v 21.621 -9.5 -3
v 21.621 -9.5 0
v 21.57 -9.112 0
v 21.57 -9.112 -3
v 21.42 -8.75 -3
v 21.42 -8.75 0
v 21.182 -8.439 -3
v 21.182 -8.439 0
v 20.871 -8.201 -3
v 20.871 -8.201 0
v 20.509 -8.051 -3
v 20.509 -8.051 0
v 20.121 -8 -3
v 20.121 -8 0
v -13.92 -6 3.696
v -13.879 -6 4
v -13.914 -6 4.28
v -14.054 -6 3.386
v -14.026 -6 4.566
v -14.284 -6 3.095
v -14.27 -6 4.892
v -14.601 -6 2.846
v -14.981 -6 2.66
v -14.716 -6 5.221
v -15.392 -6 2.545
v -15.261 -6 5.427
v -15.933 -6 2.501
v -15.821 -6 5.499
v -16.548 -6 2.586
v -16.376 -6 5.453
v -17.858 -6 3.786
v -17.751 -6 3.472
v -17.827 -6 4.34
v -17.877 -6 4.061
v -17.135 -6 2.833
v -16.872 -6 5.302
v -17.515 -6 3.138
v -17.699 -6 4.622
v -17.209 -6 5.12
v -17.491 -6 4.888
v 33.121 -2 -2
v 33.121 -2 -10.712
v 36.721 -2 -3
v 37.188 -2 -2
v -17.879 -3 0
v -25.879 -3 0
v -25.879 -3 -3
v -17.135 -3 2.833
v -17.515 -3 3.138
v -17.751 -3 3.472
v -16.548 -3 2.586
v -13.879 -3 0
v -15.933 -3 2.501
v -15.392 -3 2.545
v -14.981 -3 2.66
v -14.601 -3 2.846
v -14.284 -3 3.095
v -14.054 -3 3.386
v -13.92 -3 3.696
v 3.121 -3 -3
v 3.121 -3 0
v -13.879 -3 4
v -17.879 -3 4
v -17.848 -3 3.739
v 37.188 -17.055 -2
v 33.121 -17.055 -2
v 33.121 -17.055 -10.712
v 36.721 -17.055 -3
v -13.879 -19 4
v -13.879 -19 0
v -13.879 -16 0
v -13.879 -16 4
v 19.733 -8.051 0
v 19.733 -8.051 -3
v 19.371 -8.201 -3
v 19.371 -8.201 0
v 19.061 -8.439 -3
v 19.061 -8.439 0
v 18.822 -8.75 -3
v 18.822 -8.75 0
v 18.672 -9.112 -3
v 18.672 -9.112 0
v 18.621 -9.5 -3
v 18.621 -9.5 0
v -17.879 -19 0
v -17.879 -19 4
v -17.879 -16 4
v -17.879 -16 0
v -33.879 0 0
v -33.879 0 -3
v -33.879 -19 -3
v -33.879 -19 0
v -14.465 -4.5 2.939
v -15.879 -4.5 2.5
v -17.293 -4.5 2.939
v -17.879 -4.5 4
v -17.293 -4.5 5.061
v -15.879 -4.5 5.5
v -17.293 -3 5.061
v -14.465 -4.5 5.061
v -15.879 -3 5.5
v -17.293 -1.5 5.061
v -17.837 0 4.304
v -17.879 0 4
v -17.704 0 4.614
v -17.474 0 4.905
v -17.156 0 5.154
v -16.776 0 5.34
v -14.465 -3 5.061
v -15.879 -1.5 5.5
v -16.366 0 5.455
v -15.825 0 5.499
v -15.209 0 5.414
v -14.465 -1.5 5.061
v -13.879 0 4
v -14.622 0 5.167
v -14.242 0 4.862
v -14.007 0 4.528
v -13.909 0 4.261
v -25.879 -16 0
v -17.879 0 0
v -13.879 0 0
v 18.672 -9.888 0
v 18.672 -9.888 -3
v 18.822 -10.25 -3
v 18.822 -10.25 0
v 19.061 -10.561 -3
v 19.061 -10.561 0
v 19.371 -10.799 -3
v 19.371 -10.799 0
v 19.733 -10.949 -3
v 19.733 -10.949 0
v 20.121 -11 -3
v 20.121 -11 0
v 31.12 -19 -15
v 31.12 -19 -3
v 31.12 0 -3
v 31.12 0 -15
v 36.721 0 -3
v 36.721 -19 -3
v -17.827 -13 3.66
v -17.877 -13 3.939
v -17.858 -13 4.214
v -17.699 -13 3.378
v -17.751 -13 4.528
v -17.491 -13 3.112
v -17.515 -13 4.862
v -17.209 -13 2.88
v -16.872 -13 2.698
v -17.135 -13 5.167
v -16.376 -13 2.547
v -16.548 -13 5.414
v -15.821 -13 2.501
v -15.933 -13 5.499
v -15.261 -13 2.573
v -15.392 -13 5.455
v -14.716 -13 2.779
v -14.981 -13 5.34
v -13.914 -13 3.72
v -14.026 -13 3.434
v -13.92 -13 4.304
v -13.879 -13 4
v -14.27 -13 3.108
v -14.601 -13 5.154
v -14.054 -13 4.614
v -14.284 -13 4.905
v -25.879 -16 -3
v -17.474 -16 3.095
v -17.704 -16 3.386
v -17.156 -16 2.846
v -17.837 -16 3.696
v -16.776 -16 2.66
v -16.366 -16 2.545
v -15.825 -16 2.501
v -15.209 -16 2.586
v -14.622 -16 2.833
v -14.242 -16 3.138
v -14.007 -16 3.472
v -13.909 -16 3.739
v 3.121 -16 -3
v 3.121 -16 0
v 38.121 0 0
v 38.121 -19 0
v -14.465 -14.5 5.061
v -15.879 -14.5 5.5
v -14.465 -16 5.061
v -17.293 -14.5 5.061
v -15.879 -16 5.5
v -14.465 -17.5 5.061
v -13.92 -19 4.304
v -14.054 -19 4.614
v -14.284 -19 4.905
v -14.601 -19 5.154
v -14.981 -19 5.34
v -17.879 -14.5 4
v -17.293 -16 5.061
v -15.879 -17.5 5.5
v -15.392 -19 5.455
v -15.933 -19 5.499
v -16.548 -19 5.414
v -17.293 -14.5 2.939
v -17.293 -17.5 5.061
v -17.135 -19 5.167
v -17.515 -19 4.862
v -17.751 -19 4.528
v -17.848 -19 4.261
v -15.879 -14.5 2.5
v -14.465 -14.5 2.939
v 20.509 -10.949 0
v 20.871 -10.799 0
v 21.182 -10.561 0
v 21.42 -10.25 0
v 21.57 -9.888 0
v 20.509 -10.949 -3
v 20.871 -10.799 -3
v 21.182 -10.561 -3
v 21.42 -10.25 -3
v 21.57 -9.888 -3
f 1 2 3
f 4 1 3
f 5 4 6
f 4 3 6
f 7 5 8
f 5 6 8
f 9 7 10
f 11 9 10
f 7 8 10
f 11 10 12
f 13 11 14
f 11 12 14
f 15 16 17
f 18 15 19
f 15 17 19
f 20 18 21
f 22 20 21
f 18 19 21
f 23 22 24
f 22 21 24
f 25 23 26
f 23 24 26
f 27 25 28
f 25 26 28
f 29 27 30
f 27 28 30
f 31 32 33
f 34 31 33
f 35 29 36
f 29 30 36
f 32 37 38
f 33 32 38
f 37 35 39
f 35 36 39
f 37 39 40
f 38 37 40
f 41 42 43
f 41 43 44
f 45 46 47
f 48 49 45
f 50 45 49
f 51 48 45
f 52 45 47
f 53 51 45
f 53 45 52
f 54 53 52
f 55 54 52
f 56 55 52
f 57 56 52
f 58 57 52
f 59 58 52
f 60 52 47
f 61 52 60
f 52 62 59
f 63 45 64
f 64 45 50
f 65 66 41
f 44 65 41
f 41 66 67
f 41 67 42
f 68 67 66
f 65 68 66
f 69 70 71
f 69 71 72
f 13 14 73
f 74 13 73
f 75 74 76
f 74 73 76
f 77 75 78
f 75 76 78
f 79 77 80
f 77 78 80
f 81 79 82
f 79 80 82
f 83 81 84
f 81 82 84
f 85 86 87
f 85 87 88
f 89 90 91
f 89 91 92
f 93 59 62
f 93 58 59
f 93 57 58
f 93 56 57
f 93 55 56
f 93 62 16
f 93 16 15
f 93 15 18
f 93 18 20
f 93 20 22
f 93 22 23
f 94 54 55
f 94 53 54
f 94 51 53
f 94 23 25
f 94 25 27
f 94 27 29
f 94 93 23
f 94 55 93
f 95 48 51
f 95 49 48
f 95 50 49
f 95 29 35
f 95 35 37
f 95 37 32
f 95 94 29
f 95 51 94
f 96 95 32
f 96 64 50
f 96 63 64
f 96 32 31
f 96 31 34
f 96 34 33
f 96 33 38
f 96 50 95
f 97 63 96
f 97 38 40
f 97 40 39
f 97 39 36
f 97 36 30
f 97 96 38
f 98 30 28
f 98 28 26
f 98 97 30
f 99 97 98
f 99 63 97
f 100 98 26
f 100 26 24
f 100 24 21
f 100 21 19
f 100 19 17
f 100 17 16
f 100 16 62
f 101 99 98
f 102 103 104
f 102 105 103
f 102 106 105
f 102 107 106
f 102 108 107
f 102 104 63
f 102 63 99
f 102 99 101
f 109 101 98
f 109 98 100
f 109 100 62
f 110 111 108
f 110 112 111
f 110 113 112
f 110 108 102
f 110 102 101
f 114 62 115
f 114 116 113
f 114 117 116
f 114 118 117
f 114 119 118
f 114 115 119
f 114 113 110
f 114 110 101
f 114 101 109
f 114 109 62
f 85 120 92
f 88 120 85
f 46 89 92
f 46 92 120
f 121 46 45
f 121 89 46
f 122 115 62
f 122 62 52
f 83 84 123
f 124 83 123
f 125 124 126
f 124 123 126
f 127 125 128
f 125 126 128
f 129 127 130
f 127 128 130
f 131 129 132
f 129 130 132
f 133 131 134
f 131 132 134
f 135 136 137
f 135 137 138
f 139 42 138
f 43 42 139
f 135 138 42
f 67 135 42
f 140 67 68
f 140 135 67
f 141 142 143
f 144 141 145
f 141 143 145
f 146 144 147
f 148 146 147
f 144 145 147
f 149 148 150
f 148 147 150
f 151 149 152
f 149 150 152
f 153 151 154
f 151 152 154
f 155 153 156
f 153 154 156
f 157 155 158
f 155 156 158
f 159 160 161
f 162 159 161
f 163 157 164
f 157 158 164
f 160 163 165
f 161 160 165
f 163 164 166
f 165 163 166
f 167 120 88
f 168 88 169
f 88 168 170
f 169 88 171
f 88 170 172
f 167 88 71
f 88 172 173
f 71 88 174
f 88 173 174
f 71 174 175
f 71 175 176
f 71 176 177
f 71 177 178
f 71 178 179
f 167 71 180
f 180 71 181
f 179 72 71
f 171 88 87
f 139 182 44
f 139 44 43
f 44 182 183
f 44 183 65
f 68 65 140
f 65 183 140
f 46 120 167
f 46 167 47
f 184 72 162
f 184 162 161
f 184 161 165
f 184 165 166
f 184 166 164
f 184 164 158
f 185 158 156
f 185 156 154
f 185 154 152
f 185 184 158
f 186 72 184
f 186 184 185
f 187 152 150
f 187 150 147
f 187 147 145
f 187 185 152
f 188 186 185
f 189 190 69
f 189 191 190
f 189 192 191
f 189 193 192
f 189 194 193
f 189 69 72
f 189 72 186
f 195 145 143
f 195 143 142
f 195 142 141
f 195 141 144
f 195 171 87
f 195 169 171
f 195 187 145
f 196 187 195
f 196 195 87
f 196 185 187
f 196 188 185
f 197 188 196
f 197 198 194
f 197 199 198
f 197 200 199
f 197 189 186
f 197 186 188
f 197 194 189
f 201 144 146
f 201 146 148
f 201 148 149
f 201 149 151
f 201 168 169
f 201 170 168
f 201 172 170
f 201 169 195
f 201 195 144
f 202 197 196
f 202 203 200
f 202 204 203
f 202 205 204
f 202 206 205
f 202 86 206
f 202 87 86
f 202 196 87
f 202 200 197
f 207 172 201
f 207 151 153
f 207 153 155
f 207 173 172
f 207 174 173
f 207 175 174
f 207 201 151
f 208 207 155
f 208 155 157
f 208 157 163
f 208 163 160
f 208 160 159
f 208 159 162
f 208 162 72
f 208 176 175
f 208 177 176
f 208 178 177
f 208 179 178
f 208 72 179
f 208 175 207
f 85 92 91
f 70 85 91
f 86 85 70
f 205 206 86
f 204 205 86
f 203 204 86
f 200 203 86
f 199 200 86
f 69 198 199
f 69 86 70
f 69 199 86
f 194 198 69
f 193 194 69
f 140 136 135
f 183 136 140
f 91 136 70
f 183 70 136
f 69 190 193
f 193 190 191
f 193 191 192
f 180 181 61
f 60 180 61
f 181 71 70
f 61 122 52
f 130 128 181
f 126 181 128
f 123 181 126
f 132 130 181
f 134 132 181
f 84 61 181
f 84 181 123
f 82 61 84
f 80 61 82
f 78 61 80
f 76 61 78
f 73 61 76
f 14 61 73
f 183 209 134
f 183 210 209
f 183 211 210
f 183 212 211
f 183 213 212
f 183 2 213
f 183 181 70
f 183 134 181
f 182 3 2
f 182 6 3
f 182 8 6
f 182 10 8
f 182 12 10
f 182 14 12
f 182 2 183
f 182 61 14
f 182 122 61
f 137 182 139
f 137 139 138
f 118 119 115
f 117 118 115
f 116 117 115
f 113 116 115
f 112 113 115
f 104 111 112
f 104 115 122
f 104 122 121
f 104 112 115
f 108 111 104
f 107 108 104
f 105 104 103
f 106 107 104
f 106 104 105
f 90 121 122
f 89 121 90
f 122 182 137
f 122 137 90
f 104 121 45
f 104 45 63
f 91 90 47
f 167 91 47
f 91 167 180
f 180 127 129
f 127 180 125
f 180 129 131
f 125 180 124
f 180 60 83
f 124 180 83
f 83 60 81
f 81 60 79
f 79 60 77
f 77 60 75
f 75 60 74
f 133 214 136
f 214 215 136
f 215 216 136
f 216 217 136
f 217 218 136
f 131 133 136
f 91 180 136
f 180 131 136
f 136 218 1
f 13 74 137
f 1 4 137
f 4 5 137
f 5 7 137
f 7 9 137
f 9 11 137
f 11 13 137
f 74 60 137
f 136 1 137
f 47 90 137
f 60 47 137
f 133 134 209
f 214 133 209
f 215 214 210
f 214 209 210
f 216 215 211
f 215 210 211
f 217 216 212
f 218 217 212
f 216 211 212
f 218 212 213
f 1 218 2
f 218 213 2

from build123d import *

# Parameters (mm, degrees)
F0_W      = 72
F0_H      = 3
F1_DEPTH  = 19
F2_W      = 29
F2_H      = 13
F3_DEPTH  = 12.5
F7_DEPTH  = 19
F8_DEPTH  = 20
F9_W      = 15.054653123
F9_H      = 17.4366760552
F10_DEPTH = 25
F12_DEPTH = 12.5
F14_DEPTH = 3
F15_DEPTH = 6
F17_DEPTH = 3
F18_DEPTH = 6


with BuildPart() as f1:
    # F0 (on Front) → F1 (new body)
    with BuildSketch(Plane.XZ):
        with Locations((2.1212100983, -1.5)):
            Rectangle(F0_W, F0_H)
    extrude(amount=F1_DEPTH)

    # F2 (on face) → F3 (cut, symmetric)
    with BuildSketch(Plane.XY):
        with Locations((-11.3787899017, -9.5)):
            Rectangle(F2_W, F2_H)
    extrude(amount=F3_DEPTH, both=True, mode=Mode.SUBTRACT)

    # F6 (on face) → F7 (join)
    with BuildSketch(Plane.XZ.offset(19)):
        Polygon((36.7209195002, -3), (38.1212100983, 0), (31.1197824776, 0), (31.1197824776, -3), align=None)
        Polygon((31.1197824776, -14.999945648), (36.7209195002, -3), (31.1197824776, -3), align=None)
    extrude(amount=-F7_DEPTH)

    # F6 (on face) → F8 (cut, symmetric)
    with BuildSketch(Plane.XZ.offset(19)):
        Polygon((38.1212100983, -3), (38.1212100983, 0), (36.7209195002, -3), align=None)
        Polygon((42.2334298491, 0), (38.1212100983, 0), (38.1212100983, -3), (36.7209195002, -3), (31.1197824776, -14.999945648), (42.2334298491, -15.8877465874), align=None)
    extrude(amount=F8_DEPTH, both=True, mode=Mode.SUBTRACT)

    # F9 (on offset) → F10 (cut)
    with BuildSketch(Plane.YZ.offset(33.1212100983)):
        with Locations((-9.5273265615, -10.7183380276)):
            Rectangle(F9_W, F9_H)
    extrude(amount=F10_DEPTH, mode=Mode.SUBTRACT)

    # F11 (on face) → F12 (cut, symmetric)
    with BuildSketch(Plane.XY):
        with BuildLine():
            Line((20.1212100983, -9.5), (20.1212100983, -8))
            ThreePointArc((20.1212100983, -8), (19.0605499265, -8.4393398282), (18.6212100983, -9.5))
            Line((18.6212100983, -9.5), (20.1212100983, -9.5))
        make_face()
        with BuildLine():
            ThreePointArc((21.6212100983, -9.5), (21.18187027, -8.4393398282), (20.1212100983, -8))
            Line((20.1212100983, -8), (20.1212100983, -9.5))
            Line((20.1212100983, -9.5), (20.1212100983, -11))
            ThreePointArc((20.1212100983, -11), (21.18187027, -10.5606601718), (21.6212100983, -9.5))
        make_face()
        with BuildLine():
            Line((20.1212100983, -9.5), (18.6212100983, -9.5))
            ThreePointArc((18.6212100983, -9.5), (19.0605499265, -10.5606601718), (20.1212100983, -11))
            Line((20.1212100983, -11), (20.1212100983, -9.5))
        make_face()
    extrude(amount=F12_DEPTH, both=True, mode=Mode.SUBTRACT)

    # F13 (on face) → F14 (join)
    with BuildSketch(Plane.XZ.offset(19)):
        with BuildLine():
            Line((-17.8787899017, 4), (-17.8787899017, 0))
            Line((-17.8787899017, 0), (-13.8787899017, 0))
            Line((-13.8787899017, 0), (-13.8787899017, 4))
            add(Edge.make_bspline(
                [(-17.8787899017, 4), (-17.8787899017, 2.5), (-15.8787899017, 2.5), (-13.8787899017, 2.5), (-13.8787899017, 4)],
                knots=[3.1415926536, 3.1415926536, 3.1415926536, 4.7123889804, 4.7123889804, 6.2831853072, 6.2831853072, 6.2831853072], degree=2, weights=[1, 0.7071067812, 1, 0.7071067812, 1]))
        make_face()
    extrude(amount=-F14_DEPTH)

    # F13 (on face) → F15 (join)
    with BuildSketch(Plane.XZ.offset(19)):
        with BuildLine():
            Line((-13.8787899017, 4), (-17.8787899017, 4))
            add(Edge.make_bspline(
                [(-17.8787899017, 4), (-17.8787899017, 2.5), (-15.8787899017, 2.5), (-13.8787899017, 2.5), (-13.8787899017, 4)],
                knots=[3.1415926536, 3.1415926536, 3.1415926536, 4.7123889804, 4.7123889804, 6.2831853072, 6.2831853072, 6.2831853072], degree=2, weights=[1, 0.7071067812, 1, 0.7071067812, 1]))
        make_face()
        with BuildLine():
            add(Edge.make_bspline(
                [(-13.8787899017, 4), (-13.8787899017, 5.5), (-15.8787899017, 5.5), (-17.8787899017, 5.5), (-17.8787899017, 4)],
                knots=[0, 0, 0, 1.5707963268, 1.5707963268, 3.1415926536, 3.1415926536, 3.1415926536], degree=2, weights=[1, 0.7071067812, 1, 0.7071067812, 1]))
            Line((-17.8787899017, 4), (-13.8787899017, 4))
        make_face()
    extrude(amount=-F15_DEPTH)

    # F16 (on face) → F17 (join)
    with BuildSketch(Plane(origin=(0, 0, 0), x_dir=(-1, 0, 0), z_dir=(0, 1, 0))):
        with BuildLine():
            Line((13.8787899017, 4), (13.8787899017, 0))
            Line((13.8787899017, 0), (17.8787899017, 0))
            Line((17.8787899017, 0), (17.8787899017, 4))
            add(Edge.make_bspline(
                [(13.8787899017, 4), (13.8787899017, 2.5), (15.8787899017, 2.5), (17.8787899017, 2.5), (17.8787899017, 4)],
                knots=[3.1415926536, 3.1415926536, 3.1415926536, 4.7123889804, 4.7123889804, 6.2831853072, 6.2831853072, 6.2831853072], degree=2, weights=[1, 0.7071067812, 1, 0.7071067812, 1]))
        make_face()
    extrude(amount=-F17_DEPTH)

    # F16 (on face) → F18 (join)
    with BuildSketch(Plane(origin=(0, 0, 0), x_dir=(-1, 0, 0), z_dir=(0, 1, 0))):
        with BuildLine():
            add(Edge.make_bspline(
                [(17.8787899017, 4), (17.8787899017, 5.5), (15.8787899017, 5.5), (13.8787899017, 5.5), (13.8787899017, 4)],
                knots=[0, 0, 0, 1.5707963268, 1.5707963268, 3.1415926536, 3.1415926536, 3.1415926536], degree=2, weights=[1, 0.7071067812, 1, 0.7071067812, 1]))
            add(Edge.make_bspline(
                [(13.8787899017, 4), (13.8787899017, 2.5), (15.8787899017, 2.5), (17.8787899017, 2.5), (17.8787899017, 4)],
                knots=[3.1415926536, 3.1415926536, 3.1415926536, 4.7123889804, 4.7123889804, 6.2831853072, 6.2831853072, 6.2831853072], degree=2, weights=[1, 0.7071067812, 1, 0.7071067812, 1]))
        make_face()
    extrude(amount=-F18_DEPTH)


solid = f1.part
